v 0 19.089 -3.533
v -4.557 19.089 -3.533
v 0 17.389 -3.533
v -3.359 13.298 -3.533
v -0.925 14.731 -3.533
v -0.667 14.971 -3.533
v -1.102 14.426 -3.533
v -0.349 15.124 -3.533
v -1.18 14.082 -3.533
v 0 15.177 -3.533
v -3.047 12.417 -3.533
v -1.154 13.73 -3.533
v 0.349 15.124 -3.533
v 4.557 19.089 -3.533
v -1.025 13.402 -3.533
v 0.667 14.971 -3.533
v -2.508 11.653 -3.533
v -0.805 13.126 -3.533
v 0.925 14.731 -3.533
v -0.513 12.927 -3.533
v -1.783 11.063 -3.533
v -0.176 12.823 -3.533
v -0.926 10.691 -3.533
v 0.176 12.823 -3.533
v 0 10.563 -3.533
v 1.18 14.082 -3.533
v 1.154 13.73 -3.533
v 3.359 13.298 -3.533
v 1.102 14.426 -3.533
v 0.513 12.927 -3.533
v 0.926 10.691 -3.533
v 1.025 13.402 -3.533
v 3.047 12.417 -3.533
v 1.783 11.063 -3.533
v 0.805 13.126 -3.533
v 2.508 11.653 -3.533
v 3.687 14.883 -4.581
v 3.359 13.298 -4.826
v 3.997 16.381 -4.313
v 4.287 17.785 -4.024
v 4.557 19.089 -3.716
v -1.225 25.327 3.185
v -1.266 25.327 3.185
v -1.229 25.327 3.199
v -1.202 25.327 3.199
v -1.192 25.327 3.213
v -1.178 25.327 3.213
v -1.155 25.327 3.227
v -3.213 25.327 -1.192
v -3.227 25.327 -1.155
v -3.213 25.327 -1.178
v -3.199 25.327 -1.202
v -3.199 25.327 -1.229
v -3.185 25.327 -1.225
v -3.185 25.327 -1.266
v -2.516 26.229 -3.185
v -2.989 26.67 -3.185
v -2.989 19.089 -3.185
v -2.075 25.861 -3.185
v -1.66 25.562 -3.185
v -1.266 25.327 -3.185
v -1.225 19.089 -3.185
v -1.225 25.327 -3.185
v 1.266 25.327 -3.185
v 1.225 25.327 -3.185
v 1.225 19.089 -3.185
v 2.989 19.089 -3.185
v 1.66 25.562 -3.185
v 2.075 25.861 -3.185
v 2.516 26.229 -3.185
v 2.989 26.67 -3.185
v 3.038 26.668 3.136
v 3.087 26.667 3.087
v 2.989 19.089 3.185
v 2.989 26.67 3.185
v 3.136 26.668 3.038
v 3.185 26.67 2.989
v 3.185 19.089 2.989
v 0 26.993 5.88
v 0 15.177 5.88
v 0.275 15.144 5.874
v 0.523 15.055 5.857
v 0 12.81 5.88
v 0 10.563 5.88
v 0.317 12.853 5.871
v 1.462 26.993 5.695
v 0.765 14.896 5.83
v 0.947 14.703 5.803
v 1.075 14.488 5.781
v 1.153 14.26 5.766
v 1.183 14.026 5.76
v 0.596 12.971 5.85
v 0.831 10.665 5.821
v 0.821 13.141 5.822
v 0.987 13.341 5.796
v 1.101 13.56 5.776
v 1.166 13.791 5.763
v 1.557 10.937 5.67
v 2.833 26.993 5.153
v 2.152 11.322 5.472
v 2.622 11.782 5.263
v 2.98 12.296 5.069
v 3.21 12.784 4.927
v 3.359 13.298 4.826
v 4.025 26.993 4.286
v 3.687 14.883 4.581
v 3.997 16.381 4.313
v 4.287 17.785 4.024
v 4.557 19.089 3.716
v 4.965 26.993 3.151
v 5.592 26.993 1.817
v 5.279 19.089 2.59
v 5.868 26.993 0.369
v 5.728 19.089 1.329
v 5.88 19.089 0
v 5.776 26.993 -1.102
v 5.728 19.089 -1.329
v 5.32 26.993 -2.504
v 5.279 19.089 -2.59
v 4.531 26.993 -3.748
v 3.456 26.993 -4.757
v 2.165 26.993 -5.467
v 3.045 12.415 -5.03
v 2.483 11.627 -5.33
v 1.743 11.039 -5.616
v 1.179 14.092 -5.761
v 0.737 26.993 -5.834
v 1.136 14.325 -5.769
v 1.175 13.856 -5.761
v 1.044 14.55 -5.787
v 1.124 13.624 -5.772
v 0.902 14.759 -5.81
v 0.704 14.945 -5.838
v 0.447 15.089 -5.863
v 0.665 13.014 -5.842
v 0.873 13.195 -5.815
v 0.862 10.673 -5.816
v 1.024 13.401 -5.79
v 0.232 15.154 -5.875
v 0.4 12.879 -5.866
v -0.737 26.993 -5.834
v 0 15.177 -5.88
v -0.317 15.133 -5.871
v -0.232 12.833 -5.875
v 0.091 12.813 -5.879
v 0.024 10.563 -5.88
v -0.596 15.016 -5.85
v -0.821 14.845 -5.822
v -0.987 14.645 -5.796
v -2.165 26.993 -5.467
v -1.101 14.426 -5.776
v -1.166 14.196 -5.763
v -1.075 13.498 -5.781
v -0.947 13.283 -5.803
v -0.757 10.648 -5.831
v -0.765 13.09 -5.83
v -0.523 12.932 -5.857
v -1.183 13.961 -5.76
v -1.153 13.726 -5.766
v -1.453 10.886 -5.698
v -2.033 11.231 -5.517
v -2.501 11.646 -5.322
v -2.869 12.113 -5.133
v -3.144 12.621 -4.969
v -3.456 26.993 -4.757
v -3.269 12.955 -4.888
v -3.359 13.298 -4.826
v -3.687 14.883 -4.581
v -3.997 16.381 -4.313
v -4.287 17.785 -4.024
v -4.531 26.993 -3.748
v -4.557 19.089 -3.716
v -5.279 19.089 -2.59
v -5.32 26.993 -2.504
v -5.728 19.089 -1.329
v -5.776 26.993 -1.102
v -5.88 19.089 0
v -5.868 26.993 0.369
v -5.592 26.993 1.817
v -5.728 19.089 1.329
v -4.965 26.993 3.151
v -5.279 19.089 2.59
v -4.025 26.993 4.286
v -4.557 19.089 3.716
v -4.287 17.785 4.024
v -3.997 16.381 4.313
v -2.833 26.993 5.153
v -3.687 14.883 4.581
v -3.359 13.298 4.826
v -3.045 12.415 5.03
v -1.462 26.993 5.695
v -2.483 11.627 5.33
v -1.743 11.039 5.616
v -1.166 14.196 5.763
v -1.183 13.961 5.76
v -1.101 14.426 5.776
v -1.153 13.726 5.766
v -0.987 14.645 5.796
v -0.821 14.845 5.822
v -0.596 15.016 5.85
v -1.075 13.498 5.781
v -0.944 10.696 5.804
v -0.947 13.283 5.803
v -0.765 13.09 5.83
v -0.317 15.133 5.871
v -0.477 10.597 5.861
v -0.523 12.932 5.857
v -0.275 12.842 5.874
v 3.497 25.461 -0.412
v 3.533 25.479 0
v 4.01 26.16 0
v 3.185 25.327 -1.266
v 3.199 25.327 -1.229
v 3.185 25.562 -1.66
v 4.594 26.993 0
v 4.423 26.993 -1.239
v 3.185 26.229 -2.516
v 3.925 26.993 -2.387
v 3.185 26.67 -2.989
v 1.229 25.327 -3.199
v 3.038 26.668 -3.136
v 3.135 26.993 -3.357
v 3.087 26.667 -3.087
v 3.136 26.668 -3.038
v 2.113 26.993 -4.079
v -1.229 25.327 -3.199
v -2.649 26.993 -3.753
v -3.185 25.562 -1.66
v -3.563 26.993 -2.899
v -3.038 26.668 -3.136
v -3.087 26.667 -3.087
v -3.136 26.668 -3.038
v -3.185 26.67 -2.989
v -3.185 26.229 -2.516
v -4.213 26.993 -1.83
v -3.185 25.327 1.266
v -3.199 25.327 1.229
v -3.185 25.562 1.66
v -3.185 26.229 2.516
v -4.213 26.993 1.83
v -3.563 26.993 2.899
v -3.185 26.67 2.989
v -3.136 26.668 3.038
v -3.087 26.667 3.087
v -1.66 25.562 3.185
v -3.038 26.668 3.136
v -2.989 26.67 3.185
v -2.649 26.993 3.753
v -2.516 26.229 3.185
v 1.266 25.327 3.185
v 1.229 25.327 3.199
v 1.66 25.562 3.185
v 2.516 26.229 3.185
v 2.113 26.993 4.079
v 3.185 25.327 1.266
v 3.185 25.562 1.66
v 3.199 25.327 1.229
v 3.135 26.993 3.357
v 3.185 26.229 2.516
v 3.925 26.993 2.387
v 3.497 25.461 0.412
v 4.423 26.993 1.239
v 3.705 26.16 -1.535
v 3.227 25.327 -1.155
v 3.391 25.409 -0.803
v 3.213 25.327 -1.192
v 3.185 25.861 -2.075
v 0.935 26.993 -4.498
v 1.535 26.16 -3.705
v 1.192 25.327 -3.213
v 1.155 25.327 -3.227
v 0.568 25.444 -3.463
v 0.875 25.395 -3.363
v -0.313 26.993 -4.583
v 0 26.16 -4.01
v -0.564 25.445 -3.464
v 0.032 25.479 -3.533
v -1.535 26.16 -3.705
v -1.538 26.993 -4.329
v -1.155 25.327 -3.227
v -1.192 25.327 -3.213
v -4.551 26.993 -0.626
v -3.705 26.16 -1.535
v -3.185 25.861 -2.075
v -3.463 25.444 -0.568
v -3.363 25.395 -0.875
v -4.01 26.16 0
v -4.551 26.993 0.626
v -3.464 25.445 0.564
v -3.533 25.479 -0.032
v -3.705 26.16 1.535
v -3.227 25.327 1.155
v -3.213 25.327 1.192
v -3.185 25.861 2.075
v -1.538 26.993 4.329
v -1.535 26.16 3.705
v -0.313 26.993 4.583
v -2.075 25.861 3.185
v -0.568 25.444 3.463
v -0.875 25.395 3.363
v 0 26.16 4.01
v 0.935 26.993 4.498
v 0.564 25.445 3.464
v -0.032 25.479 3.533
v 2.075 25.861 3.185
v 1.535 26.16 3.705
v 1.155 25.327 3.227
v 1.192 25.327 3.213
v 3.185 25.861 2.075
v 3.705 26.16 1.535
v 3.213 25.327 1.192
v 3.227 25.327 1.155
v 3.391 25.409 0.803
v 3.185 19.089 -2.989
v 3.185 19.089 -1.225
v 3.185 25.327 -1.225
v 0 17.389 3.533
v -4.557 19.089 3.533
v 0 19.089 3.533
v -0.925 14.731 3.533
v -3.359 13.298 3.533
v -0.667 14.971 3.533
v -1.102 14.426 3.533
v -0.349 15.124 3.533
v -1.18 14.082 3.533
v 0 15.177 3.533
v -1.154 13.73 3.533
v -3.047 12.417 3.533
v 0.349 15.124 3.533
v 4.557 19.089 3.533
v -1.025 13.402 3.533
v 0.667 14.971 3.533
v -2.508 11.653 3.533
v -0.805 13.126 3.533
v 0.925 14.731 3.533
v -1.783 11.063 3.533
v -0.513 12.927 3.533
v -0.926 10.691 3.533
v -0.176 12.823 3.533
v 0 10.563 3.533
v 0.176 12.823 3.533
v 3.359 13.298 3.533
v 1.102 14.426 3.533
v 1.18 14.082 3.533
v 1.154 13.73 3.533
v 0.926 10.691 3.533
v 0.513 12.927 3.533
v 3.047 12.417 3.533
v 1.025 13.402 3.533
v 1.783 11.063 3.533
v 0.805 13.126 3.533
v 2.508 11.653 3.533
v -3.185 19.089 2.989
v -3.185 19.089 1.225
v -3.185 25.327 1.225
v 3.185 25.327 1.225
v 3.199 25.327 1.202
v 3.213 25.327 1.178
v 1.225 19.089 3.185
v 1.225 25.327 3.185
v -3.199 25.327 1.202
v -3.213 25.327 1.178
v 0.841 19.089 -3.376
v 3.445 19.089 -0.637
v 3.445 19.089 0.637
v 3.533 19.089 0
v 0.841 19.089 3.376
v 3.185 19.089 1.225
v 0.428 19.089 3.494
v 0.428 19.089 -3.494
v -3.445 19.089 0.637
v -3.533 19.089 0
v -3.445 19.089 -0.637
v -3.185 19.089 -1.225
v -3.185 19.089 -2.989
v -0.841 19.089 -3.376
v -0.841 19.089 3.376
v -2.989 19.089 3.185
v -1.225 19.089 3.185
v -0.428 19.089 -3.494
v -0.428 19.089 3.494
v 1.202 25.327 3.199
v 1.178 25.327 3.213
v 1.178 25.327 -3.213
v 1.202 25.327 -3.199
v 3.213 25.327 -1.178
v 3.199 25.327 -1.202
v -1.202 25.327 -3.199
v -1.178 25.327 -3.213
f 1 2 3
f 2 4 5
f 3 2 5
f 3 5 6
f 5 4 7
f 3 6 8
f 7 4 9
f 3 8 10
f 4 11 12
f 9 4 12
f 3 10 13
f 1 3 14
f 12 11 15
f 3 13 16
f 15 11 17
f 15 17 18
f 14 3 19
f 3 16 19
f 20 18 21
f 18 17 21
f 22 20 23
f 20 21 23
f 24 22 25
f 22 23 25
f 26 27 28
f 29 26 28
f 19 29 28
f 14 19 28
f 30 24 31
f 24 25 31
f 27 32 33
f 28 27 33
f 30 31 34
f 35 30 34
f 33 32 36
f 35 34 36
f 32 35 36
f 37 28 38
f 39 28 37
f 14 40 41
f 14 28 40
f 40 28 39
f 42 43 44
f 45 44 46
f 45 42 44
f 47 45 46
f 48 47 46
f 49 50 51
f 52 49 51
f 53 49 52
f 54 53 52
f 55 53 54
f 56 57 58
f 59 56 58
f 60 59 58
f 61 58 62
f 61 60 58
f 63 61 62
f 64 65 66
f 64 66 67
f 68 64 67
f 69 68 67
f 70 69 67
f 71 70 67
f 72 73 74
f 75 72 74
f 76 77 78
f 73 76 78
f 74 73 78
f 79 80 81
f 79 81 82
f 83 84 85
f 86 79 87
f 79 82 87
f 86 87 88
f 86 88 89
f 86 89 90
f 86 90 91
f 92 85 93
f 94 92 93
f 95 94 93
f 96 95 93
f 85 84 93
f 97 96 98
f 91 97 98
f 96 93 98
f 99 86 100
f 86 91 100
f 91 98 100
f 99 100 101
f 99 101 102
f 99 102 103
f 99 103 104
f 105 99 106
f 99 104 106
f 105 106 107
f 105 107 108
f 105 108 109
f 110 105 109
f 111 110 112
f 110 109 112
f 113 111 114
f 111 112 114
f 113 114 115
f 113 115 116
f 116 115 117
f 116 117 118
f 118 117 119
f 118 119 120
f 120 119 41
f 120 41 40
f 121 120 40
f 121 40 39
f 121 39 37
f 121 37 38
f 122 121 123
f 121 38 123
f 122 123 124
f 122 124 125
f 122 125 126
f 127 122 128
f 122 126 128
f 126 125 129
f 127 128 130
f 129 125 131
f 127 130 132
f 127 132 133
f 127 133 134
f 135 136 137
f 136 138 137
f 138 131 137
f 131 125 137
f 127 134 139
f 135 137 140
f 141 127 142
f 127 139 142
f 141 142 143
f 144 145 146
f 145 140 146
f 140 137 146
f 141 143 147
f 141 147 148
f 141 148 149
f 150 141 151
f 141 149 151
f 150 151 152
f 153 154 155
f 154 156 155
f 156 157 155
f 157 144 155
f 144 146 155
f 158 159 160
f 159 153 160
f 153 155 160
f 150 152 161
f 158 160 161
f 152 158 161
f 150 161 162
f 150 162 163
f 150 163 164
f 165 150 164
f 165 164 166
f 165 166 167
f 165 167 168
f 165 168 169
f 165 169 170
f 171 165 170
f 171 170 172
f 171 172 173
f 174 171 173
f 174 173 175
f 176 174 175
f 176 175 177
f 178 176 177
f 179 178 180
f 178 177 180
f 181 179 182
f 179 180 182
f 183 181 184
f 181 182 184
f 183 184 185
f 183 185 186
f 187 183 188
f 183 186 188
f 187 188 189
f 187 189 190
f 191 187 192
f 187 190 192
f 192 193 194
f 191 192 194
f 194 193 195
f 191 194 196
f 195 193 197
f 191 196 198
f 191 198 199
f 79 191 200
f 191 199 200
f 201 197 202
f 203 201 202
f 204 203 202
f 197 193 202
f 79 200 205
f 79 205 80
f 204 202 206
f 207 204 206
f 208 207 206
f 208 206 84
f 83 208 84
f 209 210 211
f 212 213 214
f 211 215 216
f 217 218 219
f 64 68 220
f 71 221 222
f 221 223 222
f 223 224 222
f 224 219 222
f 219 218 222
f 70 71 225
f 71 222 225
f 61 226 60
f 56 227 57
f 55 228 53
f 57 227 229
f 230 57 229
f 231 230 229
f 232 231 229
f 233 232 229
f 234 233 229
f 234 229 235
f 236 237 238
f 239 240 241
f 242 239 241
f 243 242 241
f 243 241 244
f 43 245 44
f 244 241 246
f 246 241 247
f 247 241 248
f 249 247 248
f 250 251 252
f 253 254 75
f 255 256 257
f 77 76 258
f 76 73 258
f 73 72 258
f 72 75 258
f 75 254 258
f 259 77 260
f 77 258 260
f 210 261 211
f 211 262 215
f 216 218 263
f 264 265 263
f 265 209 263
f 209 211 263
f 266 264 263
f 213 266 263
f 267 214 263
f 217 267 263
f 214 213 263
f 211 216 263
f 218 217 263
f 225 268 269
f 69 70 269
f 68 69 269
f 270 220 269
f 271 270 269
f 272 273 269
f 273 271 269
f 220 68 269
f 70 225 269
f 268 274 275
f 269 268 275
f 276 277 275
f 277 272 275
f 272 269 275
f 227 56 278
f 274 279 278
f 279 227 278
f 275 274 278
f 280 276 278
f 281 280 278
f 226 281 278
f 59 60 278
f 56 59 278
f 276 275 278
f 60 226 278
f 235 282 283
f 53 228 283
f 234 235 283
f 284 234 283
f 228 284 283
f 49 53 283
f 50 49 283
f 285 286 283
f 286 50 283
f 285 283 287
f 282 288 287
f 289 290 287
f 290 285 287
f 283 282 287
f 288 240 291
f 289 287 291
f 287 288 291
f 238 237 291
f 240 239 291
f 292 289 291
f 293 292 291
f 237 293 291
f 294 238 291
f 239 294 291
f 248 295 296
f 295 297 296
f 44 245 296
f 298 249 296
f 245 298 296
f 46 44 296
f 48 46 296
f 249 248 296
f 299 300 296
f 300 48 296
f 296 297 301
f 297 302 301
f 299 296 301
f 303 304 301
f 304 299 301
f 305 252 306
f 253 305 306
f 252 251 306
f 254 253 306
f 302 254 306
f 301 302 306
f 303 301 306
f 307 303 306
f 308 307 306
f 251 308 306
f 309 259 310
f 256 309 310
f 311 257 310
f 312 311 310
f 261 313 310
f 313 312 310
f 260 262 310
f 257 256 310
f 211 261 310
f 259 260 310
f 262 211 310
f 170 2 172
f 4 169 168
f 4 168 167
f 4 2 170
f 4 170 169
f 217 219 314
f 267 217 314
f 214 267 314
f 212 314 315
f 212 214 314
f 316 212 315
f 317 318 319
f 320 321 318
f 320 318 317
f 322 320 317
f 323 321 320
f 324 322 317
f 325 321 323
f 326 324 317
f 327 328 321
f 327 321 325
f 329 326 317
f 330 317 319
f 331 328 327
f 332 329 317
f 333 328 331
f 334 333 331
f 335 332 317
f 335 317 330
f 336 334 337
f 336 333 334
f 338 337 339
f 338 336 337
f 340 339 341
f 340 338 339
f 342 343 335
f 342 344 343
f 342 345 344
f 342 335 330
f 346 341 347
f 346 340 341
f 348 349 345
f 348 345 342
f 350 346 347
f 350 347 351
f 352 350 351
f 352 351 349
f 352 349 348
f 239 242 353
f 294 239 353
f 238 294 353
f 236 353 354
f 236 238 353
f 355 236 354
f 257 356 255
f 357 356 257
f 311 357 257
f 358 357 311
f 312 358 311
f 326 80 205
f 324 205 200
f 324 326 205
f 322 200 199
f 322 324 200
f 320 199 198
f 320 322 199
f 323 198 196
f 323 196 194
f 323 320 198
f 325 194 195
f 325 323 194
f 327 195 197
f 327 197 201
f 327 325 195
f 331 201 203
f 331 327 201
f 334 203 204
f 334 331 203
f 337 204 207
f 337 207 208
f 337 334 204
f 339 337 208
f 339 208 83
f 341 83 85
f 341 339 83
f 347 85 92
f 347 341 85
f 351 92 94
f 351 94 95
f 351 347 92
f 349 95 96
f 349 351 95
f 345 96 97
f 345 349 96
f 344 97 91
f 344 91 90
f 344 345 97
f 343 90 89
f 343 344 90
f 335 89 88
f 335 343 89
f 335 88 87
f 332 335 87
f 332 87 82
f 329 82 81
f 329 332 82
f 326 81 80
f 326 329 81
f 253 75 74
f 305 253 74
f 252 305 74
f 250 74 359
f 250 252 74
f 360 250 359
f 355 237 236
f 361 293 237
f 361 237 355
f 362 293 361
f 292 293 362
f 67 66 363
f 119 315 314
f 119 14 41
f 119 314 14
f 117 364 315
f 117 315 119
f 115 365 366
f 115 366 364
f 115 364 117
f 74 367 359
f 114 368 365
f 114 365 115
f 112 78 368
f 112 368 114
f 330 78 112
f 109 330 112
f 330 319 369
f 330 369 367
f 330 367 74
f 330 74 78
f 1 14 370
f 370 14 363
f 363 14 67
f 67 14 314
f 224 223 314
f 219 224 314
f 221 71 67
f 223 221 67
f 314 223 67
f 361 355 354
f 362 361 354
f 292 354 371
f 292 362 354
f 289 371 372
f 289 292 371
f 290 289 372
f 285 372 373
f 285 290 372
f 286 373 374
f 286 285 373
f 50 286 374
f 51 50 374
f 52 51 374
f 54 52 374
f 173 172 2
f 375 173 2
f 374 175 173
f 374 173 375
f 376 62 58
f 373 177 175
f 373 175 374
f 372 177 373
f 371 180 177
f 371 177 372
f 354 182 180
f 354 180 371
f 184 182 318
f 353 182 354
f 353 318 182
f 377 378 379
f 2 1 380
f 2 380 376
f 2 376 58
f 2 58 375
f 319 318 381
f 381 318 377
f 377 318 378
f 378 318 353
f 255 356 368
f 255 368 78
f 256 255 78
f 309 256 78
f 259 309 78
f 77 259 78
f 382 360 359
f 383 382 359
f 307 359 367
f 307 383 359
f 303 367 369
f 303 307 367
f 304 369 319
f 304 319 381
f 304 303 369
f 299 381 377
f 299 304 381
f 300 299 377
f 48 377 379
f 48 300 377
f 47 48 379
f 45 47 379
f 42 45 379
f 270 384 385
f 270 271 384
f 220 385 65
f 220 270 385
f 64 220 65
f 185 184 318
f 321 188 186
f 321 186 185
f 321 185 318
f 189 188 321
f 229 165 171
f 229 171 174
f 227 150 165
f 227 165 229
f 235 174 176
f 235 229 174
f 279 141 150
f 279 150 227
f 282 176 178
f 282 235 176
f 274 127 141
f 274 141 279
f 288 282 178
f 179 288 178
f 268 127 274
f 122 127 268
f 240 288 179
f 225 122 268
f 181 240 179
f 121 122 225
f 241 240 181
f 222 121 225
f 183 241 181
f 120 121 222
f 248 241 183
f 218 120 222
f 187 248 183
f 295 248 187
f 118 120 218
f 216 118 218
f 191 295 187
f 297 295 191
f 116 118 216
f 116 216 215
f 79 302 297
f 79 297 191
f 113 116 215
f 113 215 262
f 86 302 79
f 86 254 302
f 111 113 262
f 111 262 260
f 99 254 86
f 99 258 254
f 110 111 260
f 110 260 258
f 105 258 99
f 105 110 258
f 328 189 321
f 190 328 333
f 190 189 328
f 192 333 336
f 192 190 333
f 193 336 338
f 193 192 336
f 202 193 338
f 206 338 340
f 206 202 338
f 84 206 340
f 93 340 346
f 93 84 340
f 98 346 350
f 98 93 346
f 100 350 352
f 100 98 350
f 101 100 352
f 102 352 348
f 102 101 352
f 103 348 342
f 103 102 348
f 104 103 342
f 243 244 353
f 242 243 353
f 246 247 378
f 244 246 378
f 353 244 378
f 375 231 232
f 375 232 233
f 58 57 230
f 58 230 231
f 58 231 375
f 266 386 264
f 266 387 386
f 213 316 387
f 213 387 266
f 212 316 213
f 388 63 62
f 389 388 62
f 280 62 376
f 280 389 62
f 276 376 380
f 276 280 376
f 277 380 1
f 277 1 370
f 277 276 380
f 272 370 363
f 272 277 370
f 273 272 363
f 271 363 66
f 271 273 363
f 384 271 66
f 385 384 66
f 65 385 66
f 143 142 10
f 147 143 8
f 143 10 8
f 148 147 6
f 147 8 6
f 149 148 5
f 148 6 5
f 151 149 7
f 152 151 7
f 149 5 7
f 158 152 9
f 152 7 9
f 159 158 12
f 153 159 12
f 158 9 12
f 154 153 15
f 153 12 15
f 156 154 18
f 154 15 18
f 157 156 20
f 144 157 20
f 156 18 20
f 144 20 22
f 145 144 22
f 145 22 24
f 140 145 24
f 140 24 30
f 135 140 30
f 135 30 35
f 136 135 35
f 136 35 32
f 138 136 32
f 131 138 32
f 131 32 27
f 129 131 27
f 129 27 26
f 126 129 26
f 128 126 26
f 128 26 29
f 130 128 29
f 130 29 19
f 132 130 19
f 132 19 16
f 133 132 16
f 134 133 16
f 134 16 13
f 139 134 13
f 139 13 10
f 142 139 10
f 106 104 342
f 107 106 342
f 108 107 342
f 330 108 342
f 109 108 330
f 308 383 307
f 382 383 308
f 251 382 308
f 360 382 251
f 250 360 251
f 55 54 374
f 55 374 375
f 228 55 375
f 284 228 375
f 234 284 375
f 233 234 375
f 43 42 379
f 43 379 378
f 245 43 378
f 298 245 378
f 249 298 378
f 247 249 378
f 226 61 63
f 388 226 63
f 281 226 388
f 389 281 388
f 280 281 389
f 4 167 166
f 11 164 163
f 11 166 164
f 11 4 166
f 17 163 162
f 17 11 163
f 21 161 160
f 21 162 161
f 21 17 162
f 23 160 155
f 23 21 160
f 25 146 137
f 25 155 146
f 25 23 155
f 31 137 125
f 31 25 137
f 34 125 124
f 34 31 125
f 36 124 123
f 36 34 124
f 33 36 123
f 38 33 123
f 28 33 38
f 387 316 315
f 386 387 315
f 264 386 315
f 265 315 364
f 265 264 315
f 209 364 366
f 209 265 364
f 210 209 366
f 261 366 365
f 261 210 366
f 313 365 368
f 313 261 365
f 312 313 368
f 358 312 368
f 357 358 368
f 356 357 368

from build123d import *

# Parameters (mm, degrees)
SKETCH1_R           = 12
BOSS_EXTRUDE1_DEPTH = 33.53
CUT_EXTRUDE1_DEPTH  = 19.6
CHAMFER1_SIZE       = 0.4
SKETCH3_R           = 9.375
CUT_EXTRUDE2_DEPTH  = 3.4
CUT_EXTRUDE2_DRAFT  = -35
SKETCH4_W           = 24
SKETCH4_H           = 14.42225279
CUT_EXTRUDE3_DEPTH  = 17.4
SKETCH5_R           = 2.415
CUT_EXTRUDE4_DEPTH  = 33.7
SCALE1_SCALE        = 0.49


with BuildPart() as part:
    # Sketch1 → Boss-Extrude1 (new body)
    with BuildSketch(Plane(origin=(0, 0, 0), x_dir=(1, 0, 0), z_dir=(0, 1, 0))):
        with Locations(Location((0, 0, 0), (0, 0, 270))):
            Circle(SKETCH1_R)
    extrude(amount=BOSS_EXTRUDE1_DEPTH)

    # Sketch2 → Cut-Extrude1 (cut)
    with BuildSketch(Plane(origin=(0, 33.53, 0), x_dir=(1, 0, 0), z_dir=(0, 1, 0))):
        with BuildLine():
            Line((-6.5, 6.5), (-2.5, 6.5))
            ThreePointArc((-2.5, 6.5), (0, 7.211126395), (2.5, 6.5))
            Line((2.5, 6.5), (6.5, 6.5))
            Line((6.5, 6.5), (6.5, 2.5))
            ThreePointArc((6.5, 2.5), (7.211126395, 0), (6.5, -2.5))
            Line((6.5, -2.5), (6.5, -6.5))
            Line((6.5, -6.5), (2.5, -6.5))
            ThreePointArc((2.5, -6.5), (0, -7.211126395), (-2.5, -6.5))
            Line((-2.5, -6.5), (-6.5, -6.5))
            Line((-6.5, -6.5), (-6.5, -2.5))
            ThreePointArc((-6.5, -2.5), (-7.211126395, 0), (-6.5, 2.5))
            Line((-6.5, 2.5), (-6.5, 6.5))
        make_face()
    extrude(amount=-CUT_EXTRUDE1_DEPTH, mode=Mode.SUBTRACT)

    # Chamfer1
    chamfer1_edges = [part.edges().sort_by_distance(p)[0] for p in [
        (-6.5, 23.73, -6.5),
        (6.5, 23.73, -6.5),
        (6.5, 23.73, 6.5),
        (-6.5, 23.73, 6.5),
    ]]
    chamfer(chamfer1_edges, length=CHAMFER1_SIZE)


with BuildPart() as cut_extrude2_tool:
    # Sketch3 → Cut-Extrude2 (with draft: the straight prism first)
    with BuildSketch(Plane(origin=(0, 33.53, 0), x_dir=(1, 0, 0), z_dir=(0, 1, 0))):
        Circle(SKETCH3_R)
    extrude(amount=-CUT_EXTRUDE2_DEPTH)
    # Cut-Extrude2: the draft: its side faces are tilted about the plane it starts from
    cut_extrude2_sides = [cut_extrude2_tool.faces().sort_by_distance(p)[0] for p in [
        (-9.375, 31.83, 0),
    ]]
    draft(cut_extrude2_sides, Plane(origin=(0, 33.53, 0), x_dir=(1, 0, 0), z_dir=(0, 1, 0)), CUT_EXTRUDE2_DRAFT)


with BuildPart() as part_1:
    add(part.part)

    # Cut-Extrude2: cut by cut_extrude2_tool
    add(cut_extrude2_tool.part, mode=Mode.SUBTRACT)

    # Sketch4 → Cut-Extrude3 (cut)
    with BuildSketch(Plane.XZ):
        Rectangle(SKETCH4_W, SKETCH4_H)
    extrude(amount=-CUT_EXTRUDE3_DEPTH, mode=Mode.SUBTRACT)

    # Sketch5 → Cut-Extrude4 (cut, symmetric)
    with BuildSketch(Plane.XY):
        with Locations(Location((0, 7, 0), (0, 0, 90))):
            Circle(SKETCH5_R)
        with BuildLine():
            ThreePointArc((-6.854820161, 5.581747356), (0, 0), (6.854820161, 5.581747356))
            Line((6.854820161, 5.581747356), (9.3, 17.4))
            Line((9.3, 17.4), (12, 17.4))
            Line((12, 17.4), (12, -3.192277431))
            Line((12, -3.192277431), (-12, -3.192277431))
            Line((-12, -3.192277431), (-12, 17.4))
            Line((-12, 17.4), (-9.3, 17.4))
            Line((-9.3, 17.4), (-6.854820161, 5.581747356))
        make_face()
    extrude(amount=CUT_EXTRUDE4_DEPTH, both=True, mode=Mode.SUBTRACT)


with BuildPart() as part_2:
    # Scale1: scaled about (-1.86e-07, 20.712300737, 4.053e-06)
    add(part_1.part.scale(SCALE1_SCALE).moved(Location((-9.5e-08, 10.563273376, 2.067e-06))))


solid = part_2.part
